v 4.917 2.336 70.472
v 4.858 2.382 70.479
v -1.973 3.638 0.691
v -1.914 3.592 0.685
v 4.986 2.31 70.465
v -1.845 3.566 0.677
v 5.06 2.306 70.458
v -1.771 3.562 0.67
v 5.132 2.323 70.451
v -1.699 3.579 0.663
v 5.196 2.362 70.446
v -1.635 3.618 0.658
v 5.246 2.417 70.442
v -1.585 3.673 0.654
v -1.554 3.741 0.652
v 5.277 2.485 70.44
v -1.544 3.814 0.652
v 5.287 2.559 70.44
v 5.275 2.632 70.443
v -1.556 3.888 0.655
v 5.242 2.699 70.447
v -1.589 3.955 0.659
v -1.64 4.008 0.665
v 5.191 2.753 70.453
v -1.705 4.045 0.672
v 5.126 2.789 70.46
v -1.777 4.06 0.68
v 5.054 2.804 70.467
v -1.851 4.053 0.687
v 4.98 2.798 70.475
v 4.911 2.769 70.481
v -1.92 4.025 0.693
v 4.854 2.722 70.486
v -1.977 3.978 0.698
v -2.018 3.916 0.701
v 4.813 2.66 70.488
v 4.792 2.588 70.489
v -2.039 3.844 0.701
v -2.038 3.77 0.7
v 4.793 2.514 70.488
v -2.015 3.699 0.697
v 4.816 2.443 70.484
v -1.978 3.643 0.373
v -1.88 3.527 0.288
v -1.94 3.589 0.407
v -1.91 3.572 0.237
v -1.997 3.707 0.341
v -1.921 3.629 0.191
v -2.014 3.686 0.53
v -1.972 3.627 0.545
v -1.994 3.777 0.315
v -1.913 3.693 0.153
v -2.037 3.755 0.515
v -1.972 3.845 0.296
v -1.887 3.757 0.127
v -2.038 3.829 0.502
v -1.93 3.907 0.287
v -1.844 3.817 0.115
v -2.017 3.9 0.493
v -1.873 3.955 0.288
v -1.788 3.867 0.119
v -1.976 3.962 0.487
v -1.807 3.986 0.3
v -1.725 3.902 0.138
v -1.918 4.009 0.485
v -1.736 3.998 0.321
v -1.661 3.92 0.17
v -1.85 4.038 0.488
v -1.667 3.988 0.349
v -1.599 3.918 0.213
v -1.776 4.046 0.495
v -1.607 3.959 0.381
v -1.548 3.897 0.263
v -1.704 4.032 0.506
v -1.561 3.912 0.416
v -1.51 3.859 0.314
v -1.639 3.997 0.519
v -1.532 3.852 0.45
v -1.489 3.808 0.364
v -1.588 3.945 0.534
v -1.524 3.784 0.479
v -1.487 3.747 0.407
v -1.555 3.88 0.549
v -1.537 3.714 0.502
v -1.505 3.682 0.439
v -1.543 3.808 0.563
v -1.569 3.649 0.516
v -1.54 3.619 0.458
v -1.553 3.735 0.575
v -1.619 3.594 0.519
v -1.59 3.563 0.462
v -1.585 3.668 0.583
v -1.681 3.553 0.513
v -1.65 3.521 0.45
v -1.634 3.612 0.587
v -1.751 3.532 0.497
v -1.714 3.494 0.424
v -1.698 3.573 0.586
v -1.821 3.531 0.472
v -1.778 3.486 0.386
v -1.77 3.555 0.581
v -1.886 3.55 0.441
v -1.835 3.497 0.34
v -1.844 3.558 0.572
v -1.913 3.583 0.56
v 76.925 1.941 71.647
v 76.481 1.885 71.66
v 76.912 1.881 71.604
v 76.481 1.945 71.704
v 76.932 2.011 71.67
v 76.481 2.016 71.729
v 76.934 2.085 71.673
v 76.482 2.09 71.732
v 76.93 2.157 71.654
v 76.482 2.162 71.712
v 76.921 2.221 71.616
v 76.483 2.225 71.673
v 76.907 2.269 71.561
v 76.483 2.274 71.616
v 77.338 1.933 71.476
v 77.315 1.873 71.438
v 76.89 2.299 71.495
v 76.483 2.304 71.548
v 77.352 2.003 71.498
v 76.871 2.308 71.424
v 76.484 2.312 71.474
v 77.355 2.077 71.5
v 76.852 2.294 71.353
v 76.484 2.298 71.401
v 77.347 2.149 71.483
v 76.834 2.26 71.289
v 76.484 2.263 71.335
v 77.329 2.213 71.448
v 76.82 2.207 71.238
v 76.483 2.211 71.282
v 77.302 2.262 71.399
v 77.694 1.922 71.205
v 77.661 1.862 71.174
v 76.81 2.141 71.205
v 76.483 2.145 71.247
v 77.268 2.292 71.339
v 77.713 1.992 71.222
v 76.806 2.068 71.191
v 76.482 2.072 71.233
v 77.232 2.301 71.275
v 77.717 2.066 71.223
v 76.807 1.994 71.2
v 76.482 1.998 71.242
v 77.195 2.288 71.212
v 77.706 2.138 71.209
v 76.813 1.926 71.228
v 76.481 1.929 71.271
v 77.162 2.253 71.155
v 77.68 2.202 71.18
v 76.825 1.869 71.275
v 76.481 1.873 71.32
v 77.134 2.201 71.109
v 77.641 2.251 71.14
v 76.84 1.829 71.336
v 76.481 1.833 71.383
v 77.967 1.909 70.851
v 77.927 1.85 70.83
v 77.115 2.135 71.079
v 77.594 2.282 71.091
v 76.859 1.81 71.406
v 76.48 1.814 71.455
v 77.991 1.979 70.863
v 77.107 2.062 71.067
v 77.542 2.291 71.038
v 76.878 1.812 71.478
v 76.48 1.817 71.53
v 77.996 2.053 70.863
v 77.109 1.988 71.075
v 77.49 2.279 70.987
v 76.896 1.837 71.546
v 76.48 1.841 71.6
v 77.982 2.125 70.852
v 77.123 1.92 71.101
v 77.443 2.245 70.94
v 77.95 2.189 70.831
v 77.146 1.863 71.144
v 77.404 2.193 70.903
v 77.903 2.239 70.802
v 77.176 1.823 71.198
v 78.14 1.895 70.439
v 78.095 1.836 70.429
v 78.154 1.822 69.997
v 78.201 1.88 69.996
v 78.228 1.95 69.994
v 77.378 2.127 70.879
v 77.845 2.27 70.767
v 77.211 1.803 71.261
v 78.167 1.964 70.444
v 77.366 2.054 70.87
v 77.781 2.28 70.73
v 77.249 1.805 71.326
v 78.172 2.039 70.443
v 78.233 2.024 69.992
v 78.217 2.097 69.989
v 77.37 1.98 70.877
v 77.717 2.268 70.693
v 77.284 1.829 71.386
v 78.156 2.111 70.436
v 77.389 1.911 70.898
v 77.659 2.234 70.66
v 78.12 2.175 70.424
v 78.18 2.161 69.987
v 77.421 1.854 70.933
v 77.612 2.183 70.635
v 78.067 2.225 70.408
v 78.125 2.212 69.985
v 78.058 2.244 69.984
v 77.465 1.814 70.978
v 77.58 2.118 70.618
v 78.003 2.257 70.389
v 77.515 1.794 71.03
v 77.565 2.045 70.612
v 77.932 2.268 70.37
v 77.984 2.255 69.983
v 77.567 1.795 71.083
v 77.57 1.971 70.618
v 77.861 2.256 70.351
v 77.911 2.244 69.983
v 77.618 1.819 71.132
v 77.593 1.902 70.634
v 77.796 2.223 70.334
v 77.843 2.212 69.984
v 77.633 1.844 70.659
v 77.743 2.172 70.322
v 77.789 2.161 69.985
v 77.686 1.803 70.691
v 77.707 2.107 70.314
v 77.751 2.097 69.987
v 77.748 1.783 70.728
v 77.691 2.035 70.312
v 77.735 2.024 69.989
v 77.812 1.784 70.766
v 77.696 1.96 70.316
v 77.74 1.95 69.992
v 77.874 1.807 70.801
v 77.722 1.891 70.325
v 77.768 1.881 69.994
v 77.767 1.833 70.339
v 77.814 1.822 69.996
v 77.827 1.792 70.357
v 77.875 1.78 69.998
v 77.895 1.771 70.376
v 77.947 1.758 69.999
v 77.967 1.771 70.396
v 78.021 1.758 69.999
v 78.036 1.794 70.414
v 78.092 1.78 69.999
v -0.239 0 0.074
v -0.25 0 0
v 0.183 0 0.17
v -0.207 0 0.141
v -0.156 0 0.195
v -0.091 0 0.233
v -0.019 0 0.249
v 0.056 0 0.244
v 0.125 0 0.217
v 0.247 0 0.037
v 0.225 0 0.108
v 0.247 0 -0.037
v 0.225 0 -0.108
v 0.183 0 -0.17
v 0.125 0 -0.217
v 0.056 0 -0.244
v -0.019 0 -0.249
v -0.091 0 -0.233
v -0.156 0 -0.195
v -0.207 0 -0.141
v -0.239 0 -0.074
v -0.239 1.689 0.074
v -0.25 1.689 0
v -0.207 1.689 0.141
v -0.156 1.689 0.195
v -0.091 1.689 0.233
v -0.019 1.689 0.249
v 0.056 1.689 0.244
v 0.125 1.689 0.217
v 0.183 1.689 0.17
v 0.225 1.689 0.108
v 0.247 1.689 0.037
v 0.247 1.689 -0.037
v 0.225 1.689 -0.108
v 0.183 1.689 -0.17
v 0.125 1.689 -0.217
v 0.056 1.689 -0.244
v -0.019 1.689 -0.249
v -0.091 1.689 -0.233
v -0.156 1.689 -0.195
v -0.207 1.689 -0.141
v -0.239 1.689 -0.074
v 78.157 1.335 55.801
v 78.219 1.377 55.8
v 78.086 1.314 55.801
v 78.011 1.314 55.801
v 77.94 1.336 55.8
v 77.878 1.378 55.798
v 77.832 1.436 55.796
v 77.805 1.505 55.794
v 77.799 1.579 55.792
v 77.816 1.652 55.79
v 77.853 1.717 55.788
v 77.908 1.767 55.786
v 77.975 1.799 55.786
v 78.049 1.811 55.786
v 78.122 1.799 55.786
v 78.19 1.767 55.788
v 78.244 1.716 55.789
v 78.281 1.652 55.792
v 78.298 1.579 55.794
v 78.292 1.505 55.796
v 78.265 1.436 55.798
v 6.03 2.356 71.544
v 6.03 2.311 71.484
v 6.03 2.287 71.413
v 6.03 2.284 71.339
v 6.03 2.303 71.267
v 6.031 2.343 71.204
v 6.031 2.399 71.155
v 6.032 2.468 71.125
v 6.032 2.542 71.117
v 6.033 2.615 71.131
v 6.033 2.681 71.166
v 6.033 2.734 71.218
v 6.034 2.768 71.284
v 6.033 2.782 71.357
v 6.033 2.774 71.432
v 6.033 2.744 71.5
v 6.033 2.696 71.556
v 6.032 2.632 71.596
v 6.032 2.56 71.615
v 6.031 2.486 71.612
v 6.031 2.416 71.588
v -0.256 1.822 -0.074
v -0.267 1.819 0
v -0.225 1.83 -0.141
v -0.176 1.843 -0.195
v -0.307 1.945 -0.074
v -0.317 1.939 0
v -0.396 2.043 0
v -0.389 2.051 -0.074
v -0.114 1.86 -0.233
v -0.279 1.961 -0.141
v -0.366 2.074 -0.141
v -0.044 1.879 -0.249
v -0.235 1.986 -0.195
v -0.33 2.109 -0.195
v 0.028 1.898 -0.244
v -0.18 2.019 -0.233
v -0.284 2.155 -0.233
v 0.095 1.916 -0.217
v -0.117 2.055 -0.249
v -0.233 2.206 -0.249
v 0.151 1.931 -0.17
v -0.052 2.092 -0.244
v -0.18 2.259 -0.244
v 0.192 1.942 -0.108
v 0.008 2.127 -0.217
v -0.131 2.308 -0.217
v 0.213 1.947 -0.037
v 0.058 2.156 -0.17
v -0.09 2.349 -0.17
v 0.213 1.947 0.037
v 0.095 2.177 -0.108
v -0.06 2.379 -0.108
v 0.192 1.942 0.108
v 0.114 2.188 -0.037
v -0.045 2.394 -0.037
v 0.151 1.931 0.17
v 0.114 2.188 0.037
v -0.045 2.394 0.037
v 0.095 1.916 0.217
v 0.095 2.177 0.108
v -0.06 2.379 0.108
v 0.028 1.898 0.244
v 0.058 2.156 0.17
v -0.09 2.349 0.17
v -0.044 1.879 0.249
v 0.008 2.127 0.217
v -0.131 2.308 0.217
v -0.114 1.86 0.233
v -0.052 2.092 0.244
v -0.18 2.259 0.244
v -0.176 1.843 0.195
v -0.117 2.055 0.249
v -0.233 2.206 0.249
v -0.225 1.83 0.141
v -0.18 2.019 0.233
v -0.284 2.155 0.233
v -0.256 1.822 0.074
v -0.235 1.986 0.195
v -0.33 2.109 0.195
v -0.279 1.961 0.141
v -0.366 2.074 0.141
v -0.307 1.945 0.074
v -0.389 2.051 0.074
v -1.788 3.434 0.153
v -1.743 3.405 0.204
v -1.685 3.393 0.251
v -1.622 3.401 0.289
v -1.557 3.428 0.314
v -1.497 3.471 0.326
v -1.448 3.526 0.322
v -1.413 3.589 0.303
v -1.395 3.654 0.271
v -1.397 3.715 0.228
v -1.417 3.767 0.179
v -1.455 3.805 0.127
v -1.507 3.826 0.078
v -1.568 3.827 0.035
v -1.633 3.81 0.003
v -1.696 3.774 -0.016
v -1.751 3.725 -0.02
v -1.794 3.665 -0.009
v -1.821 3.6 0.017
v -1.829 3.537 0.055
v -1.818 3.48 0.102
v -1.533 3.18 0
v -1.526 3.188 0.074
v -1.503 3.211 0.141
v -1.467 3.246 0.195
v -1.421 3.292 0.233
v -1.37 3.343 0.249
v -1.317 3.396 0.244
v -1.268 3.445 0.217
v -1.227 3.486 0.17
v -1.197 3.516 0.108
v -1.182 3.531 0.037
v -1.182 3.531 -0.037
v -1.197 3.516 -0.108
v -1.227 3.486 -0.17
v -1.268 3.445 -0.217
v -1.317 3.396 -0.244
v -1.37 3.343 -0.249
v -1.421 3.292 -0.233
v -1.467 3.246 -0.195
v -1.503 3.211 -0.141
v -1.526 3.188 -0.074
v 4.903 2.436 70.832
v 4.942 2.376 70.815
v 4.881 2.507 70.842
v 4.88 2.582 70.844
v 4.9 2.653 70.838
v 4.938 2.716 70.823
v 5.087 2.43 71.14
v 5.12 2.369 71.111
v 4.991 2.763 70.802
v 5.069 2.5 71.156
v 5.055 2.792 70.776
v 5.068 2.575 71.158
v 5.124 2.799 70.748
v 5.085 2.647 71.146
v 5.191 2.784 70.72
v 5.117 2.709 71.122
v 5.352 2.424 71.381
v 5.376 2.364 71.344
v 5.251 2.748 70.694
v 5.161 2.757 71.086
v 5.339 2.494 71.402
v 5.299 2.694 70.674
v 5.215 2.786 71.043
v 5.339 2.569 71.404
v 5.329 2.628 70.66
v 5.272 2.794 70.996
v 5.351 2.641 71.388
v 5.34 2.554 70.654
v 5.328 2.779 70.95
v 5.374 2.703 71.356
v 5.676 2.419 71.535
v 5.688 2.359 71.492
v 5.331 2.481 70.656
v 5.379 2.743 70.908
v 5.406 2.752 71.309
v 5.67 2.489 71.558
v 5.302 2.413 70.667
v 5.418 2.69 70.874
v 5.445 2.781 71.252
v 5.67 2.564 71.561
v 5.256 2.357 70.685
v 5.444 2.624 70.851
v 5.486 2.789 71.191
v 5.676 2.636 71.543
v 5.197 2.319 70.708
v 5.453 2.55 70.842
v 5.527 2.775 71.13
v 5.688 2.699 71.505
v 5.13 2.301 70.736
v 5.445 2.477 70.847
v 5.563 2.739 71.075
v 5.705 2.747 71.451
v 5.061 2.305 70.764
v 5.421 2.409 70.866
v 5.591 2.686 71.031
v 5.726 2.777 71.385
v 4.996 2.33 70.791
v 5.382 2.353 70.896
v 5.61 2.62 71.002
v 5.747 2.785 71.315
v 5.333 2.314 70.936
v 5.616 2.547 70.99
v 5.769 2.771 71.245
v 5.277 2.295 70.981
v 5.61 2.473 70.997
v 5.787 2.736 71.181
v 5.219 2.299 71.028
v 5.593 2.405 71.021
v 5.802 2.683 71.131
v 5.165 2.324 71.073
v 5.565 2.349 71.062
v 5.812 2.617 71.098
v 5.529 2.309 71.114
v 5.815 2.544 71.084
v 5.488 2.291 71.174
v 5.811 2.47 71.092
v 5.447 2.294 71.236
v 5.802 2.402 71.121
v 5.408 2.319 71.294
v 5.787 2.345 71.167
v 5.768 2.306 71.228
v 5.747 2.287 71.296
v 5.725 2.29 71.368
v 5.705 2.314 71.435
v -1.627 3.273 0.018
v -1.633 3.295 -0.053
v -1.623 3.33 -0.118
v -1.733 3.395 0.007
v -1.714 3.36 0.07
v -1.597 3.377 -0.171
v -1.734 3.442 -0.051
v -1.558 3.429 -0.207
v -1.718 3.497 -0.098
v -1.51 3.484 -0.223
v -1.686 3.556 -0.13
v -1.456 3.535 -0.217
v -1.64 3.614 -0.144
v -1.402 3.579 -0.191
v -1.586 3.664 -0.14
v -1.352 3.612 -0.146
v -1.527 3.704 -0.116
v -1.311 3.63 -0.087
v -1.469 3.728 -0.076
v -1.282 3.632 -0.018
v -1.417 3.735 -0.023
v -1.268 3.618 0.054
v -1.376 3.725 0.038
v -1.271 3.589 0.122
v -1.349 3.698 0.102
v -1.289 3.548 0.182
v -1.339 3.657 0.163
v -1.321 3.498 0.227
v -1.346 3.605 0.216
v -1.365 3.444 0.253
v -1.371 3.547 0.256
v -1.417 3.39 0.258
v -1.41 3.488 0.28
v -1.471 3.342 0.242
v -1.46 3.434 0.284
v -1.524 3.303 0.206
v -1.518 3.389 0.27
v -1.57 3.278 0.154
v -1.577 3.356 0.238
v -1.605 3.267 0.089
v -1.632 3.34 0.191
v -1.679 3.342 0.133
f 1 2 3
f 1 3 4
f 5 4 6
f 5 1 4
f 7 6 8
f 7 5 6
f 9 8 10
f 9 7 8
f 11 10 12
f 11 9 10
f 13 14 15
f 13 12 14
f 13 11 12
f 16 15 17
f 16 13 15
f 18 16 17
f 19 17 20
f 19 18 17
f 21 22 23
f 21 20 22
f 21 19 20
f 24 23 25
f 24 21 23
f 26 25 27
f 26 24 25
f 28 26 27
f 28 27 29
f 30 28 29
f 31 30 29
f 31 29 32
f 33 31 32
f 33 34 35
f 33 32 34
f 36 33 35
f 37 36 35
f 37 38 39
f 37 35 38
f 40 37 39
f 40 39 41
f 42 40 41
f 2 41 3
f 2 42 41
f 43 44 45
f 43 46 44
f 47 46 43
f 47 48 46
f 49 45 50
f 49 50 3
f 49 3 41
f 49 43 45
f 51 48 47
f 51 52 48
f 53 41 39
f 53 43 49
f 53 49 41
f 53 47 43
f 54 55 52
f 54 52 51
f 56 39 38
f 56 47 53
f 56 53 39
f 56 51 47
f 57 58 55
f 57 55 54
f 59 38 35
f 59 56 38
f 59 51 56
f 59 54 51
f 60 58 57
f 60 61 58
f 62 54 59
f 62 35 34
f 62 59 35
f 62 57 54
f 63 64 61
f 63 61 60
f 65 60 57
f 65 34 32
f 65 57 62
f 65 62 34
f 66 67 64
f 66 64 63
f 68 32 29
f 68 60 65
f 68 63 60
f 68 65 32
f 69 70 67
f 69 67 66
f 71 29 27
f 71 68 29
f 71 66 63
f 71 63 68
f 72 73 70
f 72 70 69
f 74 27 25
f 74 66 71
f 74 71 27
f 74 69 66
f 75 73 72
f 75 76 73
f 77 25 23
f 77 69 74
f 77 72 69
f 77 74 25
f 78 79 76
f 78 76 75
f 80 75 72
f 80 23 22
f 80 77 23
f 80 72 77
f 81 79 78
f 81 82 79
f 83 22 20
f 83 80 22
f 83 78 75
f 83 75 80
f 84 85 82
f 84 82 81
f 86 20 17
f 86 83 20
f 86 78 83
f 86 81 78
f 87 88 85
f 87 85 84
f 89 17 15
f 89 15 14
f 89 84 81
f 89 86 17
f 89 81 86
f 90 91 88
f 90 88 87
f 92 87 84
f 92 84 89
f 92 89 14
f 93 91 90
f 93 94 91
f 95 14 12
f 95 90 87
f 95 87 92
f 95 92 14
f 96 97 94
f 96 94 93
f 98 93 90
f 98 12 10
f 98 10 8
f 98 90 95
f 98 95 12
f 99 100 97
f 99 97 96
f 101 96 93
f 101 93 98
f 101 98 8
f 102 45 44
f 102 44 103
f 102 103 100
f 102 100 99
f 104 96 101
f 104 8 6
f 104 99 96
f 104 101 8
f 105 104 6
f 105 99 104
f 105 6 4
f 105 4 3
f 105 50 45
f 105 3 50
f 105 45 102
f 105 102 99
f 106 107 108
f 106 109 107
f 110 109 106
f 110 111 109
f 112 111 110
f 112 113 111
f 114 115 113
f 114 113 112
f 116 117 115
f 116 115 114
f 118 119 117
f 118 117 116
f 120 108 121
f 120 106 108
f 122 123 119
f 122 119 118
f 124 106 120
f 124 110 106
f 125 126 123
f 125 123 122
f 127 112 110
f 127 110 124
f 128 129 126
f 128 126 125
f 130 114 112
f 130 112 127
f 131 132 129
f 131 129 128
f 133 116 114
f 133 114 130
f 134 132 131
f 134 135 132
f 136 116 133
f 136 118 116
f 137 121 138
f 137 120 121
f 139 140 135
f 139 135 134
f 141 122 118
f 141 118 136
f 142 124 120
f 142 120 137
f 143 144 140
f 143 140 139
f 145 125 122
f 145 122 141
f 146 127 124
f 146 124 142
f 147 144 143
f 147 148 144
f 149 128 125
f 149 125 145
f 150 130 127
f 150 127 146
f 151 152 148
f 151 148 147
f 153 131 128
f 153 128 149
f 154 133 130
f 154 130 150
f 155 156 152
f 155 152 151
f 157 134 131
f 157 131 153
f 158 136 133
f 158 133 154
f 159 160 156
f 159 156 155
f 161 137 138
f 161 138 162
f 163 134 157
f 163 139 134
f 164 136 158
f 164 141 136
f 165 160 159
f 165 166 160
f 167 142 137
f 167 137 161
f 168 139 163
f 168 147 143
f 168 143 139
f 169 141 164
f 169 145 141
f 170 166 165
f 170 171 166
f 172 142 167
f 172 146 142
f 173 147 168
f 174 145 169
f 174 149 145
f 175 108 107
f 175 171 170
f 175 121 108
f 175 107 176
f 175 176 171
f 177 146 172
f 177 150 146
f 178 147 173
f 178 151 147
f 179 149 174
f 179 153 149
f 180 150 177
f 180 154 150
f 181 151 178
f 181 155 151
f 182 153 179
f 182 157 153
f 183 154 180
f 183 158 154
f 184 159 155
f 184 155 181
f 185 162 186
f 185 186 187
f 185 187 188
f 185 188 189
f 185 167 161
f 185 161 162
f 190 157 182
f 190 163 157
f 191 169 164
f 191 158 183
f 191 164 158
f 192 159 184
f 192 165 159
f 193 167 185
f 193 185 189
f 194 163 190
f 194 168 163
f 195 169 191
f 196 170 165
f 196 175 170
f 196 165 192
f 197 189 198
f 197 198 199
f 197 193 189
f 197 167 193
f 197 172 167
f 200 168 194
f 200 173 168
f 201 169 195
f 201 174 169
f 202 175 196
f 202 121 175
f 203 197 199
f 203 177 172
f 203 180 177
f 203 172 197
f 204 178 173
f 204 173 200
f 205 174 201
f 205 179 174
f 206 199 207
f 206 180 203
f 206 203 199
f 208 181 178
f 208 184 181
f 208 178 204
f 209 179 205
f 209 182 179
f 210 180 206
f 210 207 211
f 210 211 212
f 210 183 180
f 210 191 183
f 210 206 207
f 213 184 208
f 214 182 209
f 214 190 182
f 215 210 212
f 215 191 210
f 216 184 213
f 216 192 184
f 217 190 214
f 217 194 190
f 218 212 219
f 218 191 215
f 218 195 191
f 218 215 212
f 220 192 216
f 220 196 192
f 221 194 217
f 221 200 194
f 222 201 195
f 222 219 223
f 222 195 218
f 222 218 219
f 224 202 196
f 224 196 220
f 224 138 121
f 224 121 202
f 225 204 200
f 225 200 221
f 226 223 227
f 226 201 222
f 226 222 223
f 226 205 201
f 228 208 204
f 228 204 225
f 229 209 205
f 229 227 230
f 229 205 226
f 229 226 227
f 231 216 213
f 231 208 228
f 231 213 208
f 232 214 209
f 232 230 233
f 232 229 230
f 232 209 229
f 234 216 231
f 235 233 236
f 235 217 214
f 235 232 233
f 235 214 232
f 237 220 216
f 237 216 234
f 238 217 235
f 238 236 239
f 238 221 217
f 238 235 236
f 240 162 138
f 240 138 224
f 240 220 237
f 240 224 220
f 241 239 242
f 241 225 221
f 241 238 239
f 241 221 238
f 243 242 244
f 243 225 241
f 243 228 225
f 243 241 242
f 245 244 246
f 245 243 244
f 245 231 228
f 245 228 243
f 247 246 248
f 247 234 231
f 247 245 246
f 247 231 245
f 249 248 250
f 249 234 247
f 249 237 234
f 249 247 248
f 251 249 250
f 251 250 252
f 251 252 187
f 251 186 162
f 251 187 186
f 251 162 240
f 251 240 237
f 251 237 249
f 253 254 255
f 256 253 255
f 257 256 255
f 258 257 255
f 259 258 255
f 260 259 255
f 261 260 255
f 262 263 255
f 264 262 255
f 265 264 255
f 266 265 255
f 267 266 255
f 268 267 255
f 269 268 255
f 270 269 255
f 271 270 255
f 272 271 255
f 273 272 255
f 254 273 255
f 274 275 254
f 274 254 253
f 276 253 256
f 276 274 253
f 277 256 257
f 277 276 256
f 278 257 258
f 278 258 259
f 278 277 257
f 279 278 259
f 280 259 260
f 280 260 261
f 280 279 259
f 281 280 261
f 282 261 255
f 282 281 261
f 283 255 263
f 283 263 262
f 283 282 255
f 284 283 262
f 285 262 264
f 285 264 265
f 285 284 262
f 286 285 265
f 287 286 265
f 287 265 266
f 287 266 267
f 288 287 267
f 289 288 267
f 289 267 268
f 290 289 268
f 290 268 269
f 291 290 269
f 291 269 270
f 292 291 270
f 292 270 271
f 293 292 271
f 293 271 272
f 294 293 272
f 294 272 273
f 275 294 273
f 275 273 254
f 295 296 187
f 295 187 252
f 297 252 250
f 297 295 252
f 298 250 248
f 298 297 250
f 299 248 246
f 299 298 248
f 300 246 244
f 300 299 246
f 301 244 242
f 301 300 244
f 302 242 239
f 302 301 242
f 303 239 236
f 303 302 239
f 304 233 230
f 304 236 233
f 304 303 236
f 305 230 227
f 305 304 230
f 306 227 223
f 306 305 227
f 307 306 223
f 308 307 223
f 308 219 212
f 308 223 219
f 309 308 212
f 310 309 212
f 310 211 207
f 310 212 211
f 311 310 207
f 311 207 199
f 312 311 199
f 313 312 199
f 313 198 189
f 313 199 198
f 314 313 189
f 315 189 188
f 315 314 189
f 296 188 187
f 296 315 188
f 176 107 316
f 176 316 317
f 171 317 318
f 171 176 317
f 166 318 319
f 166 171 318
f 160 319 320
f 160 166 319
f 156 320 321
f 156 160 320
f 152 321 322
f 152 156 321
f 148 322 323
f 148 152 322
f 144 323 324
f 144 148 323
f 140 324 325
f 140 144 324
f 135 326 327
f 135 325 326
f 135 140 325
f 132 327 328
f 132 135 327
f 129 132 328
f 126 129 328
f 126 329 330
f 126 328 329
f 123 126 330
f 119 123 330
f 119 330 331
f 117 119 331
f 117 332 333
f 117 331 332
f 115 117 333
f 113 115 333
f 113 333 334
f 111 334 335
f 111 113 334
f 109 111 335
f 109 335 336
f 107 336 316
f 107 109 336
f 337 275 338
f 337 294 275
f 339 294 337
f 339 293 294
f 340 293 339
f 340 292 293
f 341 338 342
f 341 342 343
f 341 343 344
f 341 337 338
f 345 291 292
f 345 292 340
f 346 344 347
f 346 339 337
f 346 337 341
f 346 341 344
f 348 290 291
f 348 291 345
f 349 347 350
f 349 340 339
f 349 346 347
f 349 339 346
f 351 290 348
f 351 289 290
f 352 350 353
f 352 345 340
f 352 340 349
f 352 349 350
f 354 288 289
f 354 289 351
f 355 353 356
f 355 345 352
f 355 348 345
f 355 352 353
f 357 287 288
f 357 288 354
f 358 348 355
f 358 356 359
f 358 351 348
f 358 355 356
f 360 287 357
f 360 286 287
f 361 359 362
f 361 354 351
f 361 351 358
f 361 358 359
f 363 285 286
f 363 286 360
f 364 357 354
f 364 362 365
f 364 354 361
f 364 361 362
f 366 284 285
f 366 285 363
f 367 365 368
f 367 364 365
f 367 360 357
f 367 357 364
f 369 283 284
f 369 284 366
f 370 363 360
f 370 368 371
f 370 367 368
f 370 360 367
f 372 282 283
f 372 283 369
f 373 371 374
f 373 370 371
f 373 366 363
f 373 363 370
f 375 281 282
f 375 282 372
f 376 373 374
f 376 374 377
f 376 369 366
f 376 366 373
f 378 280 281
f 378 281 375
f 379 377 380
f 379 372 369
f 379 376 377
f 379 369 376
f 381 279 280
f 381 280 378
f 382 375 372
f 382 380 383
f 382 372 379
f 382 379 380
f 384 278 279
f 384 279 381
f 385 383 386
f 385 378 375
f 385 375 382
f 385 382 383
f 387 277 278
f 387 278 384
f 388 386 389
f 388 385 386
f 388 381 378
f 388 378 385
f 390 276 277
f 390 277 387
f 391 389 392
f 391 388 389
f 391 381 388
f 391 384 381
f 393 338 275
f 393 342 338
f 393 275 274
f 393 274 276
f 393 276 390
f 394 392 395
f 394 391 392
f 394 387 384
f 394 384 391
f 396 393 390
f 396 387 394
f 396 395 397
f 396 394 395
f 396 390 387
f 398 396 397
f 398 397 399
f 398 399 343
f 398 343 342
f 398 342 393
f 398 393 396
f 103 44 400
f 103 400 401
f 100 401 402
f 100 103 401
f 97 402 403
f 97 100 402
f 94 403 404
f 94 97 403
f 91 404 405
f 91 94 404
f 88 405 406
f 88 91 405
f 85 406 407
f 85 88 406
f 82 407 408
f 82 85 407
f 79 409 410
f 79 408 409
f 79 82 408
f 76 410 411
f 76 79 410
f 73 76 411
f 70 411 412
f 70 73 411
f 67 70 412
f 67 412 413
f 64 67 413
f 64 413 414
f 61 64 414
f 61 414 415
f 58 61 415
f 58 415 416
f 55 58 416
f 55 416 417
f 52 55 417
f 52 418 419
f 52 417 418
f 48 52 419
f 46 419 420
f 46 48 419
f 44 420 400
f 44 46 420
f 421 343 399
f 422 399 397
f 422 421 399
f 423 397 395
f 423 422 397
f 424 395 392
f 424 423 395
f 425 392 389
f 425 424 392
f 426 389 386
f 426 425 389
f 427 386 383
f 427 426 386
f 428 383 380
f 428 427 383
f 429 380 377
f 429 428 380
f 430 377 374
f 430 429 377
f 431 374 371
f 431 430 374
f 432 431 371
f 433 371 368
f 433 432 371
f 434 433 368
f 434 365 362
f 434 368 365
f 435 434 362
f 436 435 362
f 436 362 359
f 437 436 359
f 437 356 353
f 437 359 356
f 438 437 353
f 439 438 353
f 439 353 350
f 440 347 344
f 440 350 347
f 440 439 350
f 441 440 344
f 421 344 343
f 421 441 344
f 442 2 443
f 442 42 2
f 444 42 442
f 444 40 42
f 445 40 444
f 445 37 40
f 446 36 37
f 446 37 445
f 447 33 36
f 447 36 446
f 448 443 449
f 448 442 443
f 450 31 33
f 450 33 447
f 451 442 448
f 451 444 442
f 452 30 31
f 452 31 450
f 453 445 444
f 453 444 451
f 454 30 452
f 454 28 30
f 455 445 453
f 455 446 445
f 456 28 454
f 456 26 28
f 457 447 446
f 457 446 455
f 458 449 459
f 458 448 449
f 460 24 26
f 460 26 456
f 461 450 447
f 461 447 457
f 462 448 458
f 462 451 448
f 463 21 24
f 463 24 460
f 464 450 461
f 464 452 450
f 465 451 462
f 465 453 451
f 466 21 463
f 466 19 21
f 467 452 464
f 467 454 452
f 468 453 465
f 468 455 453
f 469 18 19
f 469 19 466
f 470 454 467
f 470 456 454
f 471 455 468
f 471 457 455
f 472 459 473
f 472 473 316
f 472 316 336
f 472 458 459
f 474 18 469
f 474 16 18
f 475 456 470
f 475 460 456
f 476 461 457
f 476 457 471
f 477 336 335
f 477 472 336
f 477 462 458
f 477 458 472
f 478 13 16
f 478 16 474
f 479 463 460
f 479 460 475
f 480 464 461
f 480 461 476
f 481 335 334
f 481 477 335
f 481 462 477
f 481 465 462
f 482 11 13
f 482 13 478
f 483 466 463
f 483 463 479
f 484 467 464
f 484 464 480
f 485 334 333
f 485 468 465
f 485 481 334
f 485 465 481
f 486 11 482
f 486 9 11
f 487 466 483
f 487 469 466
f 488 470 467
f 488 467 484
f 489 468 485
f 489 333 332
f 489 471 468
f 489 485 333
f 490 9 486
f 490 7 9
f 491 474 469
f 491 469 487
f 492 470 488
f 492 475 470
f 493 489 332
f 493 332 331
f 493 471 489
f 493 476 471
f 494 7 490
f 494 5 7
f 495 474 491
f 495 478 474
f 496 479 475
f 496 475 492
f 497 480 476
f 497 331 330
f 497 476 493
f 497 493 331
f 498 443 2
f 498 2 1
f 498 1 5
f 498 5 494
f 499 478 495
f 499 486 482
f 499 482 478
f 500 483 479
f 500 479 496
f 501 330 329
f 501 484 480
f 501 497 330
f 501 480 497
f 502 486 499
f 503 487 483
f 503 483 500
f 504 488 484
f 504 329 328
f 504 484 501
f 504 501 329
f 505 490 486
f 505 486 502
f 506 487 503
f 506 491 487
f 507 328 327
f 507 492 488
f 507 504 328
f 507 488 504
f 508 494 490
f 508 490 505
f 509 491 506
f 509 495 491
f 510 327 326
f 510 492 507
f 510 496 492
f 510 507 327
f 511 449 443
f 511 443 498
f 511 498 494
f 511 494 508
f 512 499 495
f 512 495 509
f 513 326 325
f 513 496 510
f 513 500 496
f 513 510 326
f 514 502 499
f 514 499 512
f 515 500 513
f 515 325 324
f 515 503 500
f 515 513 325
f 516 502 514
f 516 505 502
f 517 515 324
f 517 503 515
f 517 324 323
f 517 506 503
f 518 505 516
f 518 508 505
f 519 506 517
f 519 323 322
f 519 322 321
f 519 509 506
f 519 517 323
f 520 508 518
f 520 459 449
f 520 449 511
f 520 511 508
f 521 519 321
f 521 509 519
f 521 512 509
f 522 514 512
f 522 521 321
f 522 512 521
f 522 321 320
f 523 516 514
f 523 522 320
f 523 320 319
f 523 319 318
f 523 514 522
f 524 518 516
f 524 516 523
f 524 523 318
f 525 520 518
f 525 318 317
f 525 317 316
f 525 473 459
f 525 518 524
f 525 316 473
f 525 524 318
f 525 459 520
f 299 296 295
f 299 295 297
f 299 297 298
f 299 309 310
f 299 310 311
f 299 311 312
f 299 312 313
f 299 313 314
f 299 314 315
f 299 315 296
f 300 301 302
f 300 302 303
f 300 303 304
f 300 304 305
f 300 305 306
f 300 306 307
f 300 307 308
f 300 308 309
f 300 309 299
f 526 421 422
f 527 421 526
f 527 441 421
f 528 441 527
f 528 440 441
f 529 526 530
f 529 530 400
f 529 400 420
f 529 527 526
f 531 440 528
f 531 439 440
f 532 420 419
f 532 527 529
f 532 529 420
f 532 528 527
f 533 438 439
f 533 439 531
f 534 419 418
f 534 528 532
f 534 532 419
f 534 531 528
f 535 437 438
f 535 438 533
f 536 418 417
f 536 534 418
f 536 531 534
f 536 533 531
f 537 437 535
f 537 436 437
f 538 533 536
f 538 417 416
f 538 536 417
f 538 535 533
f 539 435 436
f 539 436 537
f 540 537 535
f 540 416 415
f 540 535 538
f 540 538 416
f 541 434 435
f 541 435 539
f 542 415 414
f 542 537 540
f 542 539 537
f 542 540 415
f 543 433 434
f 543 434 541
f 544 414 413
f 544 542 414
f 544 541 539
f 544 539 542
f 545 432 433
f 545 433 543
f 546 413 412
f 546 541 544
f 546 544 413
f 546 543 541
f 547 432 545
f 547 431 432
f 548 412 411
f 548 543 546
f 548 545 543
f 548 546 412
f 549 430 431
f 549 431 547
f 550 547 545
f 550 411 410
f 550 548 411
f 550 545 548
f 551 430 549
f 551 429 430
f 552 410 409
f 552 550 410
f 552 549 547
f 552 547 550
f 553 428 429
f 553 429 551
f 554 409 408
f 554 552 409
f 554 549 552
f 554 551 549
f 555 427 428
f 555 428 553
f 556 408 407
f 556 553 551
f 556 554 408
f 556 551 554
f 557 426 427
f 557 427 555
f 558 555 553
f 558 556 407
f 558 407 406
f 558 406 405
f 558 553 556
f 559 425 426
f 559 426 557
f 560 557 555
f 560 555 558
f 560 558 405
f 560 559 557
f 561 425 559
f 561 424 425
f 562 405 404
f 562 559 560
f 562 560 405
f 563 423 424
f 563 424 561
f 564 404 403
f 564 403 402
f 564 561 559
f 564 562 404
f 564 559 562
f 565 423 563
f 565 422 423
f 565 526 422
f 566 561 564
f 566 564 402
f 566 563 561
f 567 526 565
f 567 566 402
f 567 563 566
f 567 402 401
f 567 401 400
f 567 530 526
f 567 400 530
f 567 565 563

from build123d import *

# Parameters (mm, degrees)
SKETCH4_R = 0.25


with BuildPart() as part:
    # Sweep3: sweep along a curve in space
    with BuildLine() as sweep3_path:
        Line((0, 0, 0), (0, 1.544064667, 0))
        Line((0, 1.544064667, 0), (0, 1.689339828, 0))
        ThreePointArc((0, 1.689339828, 0), (-0.057090351, 1.976352402, 0), (-0.219669914, 2.219669914, 0))
        Line((-0.219669914, 2.219669914, 0), (-1.356620962, 3.356620962, 0))
        ThreePointArc((-1.356620962, 3.356620962, 0), (-1.494867959, 3.494867959, 0.03980924), (-1.611100924, 3.611100924, 0.152897858))
        Line((-1.611100924, 3.611100924, 0.152897858), (-1.703558649, 3.703558649, 0.2884697))
        ThreePointArc((-1.703558649, 3.703558649, 0.2884697), (-1.779855049, 3.784564692, 0.467759908), (-1.792653376, 3.810653106, 0.676766357))
        Line((-1.792653376, 3.810653106, 0.676766357), (5.038332118, 2.554741698, 70.464468026))
        ThreePointArc((5.038332118, 2.554741698, 70.464468026), (5.361128734, 2.541449861, 71.107081324), (6.031789132, 2.53248747, 71.366812889))
        Line((6.031789132, 2.53248747, 71.366812889), (76.481980897, 2.0622617, 71.483096204))
        ThreePointArc((76.481980897, 2.0622617, 71.483096204), (77.54159978, 2.041496645, 71.047363506), (77.984092861, 2.005456454, 69.990960492))
        Line((77.984092861, 2.005456454, 69.990960492), (78.048637233, 1.560660172, 55.793425553))
    # Sketch4 → Sweep3 (sweep)
    with BuildSketch(Plane(origin=(0, 0, 0), x_dir=(-1, 0, 0), z_dir=(0, 1, 0))):
        Circle(SKETCH4_R)
    sweep(path=sweep3_path.line)


solid = part.part
